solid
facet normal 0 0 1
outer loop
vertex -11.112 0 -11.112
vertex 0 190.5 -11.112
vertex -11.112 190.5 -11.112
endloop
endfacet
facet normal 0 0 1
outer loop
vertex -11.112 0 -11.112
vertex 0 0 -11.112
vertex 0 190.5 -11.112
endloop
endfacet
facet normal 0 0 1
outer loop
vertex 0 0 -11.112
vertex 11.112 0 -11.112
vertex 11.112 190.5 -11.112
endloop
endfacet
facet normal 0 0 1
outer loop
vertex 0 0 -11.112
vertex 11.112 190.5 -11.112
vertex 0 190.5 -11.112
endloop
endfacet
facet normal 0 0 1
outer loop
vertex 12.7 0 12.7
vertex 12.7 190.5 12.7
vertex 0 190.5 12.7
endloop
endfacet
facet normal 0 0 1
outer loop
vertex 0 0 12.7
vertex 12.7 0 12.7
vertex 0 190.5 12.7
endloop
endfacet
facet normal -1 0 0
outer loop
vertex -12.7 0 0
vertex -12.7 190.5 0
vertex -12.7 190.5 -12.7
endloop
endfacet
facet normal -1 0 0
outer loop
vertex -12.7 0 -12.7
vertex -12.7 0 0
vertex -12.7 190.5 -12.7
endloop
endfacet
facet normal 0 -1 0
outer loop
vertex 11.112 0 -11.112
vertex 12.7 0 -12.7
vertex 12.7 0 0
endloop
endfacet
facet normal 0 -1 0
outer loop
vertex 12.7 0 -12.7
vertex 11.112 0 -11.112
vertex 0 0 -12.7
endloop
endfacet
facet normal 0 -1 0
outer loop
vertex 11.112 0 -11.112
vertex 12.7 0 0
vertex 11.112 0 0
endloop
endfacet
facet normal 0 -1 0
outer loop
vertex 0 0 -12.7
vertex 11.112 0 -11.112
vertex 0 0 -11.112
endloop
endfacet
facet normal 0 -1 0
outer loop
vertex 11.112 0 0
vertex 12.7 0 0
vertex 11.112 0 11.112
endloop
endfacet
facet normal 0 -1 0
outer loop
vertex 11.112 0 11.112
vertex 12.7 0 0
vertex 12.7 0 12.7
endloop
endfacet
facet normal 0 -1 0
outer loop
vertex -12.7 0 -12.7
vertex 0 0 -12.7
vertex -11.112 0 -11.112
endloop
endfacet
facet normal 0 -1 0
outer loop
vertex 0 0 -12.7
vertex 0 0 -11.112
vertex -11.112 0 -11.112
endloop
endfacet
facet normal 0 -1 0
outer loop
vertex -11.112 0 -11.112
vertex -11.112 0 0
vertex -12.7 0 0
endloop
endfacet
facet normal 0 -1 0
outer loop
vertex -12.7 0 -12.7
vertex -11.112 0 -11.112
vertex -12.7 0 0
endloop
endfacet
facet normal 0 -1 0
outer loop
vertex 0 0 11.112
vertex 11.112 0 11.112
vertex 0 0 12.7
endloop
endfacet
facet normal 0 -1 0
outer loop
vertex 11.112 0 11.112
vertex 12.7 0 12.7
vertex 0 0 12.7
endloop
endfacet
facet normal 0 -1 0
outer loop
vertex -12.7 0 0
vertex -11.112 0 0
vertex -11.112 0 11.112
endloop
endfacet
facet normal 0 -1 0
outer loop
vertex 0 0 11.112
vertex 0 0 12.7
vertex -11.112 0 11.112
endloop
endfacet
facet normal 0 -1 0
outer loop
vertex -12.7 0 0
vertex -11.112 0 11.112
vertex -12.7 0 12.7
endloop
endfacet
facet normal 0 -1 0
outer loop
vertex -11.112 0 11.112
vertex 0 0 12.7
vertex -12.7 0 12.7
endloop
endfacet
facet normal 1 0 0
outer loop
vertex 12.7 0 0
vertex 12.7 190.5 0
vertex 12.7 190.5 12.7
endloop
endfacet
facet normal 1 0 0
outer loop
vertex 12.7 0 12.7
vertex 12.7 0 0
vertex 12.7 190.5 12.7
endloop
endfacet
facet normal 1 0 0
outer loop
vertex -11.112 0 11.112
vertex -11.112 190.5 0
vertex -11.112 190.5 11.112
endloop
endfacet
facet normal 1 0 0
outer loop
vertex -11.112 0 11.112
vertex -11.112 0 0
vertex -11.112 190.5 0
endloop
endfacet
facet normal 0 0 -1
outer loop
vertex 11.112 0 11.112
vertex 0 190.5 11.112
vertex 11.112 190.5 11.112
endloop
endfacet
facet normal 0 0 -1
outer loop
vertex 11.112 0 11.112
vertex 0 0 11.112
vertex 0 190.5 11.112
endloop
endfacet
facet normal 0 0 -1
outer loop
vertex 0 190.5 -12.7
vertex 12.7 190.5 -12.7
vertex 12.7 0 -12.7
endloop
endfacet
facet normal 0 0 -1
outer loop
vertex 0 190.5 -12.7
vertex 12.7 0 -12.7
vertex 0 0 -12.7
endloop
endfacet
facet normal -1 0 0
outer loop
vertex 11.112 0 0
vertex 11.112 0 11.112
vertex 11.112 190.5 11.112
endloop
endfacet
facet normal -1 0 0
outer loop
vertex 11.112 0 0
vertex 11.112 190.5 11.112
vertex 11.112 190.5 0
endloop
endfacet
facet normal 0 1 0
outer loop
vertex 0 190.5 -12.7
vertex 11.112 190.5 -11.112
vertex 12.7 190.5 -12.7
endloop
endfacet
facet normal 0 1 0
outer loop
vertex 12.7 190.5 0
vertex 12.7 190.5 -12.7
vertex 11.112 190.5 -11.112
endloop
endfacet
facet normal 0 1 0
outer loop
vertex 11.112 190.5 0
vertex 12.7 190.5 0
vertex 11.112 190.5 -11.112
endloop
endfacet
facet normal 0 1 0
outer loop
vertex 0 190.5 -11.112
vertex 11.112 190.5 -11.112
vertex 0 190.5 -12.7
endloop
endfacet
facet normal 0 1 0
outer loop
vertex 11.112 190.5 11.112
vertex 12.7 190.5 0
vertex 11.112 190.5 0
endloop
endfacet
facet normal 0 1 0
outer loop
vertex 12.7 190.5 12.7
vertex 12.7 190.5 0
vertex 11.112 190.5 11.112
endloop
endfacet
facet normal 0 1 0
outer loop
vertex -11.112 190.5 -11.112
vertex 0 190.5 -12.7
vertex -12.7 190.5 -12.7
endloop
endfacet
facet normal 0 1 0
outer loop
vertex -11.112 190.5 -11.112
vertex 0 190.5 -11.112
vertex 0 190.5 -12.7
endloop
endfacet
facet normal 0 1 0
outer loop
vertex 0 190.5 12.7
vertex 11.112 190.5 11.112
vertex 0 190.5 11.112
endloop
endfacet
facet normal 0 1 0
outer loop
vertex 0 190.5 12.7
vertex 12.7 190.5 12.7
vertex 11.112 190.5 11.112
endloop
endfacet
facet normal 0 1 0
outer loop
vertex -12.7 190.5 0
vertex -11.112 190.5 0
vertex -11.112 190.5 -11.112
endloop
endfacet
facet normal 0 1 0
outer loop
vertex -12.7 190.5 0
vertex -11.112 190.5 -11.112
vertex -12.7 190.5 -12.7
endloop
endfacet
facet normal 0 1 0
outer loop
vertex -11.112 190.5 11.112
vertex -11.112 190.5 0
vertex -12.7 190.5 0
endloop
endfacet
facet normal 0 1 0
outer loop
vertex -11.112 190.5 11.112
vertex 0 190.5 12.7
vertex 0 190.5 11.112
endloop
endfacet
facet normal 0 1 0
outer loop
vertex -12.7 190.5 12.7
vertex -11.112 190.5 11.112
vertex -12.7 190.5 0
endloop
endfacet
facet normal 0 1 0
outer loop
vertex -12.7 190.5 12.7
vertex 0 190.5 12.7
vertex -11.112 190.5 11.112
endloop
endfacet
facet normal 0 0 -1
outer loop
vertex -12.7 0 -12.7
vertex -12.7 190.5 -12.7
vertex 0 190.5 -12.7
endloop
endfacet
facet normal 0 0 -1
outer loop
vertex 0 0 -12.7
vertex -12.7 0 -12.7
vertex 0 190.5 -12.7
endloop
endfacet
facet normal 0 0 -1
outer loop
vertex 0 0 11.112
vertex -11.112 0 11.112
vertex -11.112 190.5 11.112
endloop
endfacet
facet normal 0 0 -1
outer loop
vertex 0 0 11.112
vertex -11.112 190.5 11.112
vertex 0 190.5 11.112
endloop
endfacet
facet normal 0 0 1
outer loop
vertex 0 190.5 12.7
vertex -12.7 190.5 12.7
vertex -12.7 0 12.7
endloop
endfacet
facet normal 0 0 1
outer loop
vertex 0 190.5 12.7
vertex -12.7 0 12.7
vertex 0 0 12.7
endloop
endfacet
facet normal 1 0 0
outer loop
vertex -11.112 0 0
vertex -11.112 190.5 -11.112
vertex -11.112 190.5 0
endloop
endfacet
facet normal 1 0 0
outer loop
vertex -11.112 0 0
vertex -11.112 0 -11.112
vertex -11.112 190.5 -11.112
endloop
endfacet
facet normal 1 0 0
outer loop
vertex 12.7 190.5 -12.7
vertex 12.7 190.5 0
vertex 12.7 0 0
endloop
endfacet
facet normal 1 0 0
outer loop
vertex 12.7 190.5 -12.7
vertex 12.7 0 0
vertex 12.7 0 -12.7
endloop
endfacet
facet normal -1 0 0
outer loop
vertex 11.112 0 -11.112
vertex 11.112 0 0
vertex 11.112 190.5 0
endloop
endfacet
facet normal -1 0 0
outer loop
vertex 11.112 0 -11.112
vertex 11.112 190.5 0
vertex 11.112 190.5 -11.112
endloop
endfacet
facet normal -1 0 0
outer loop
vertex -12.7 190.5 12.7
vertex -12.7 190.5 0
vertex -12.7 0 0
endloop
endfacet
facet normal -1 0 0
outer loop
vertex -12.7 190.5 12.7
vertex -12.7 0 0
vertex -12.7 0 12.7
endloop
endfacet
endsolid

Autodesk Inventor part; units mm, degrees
ref_plane "YZ Plane" through (0, 0, 0) normal (1, 0, 0) x (0, 1, 0)
ref_plane "XZ Plane" through (0, 0, 0) normal (0, 1, 0) x (-1, 0, 0)
ref_plane "XY Plane" through (0, 0, 0) normal (0, 0, 1) x (1, 0, 0)
sketch "Sketch1" plane through (0, 0, 0) normal (0, 1, 0) x (-1, 0, 0)
  line L0 (12.7, 0) -> (12.7, -12.7)
  line L1 (12.7, -12.7) -> (0, -12.7)
  line L2 (0, 0) -> (24.2319, 0) construction
  line L3 (0, 0) -> (0, -21.2534) construction
  line L4 (12.7, 0) -> (12.7, 12.7)
  line L5 (12.7, 12.7) -> (0, 12.7)
  line L6 (-12.7, 0) -> (-12.7, -12.7)
  line L7 (-12.7, -12.7) -> (0, -12.7)
  line L8 (-12.7, 0) -> (-12.7, 12.7)
  line L9 (-12.7, 12.7) -> (0, 12.7)
  line L10 (0, -11.1125) -> (11.1125, -11.1125)
  line L11 (11.1125, -11.1125) -> (11.1125, 0)
  line L12 (11.1125, 0) -> (11.1125, 11.1125)
  line L13 (11.1125, 11.1125) -> (0, 11.1125)
  line L14 (0, 11.1125) -> (-11.1125, 11.1125)
  line L15 (-11.1125, 11.1125) -> (-11.1125, 0)
  line L16 (-11.1125, 0) -> (-11.1125, -11.1125)
  line L17 (-11.1125, -11.1125) -> (0, -11.1125)
  dimension "d1" = 12.7
  dimension "d2" = 12.7
  dimension "d3" = 12.7
  dimension "d4" = 12.7
  dimension "d5" = 24.2319
  dimension "d6" = 21.2534
  dimension "d7" = 1.5875
extrude "Extrusion1" add sketch "Sketch1" along normal blind 190.5
equation "\"d3\" = d1"
properties part number "gripper arm bracket"
